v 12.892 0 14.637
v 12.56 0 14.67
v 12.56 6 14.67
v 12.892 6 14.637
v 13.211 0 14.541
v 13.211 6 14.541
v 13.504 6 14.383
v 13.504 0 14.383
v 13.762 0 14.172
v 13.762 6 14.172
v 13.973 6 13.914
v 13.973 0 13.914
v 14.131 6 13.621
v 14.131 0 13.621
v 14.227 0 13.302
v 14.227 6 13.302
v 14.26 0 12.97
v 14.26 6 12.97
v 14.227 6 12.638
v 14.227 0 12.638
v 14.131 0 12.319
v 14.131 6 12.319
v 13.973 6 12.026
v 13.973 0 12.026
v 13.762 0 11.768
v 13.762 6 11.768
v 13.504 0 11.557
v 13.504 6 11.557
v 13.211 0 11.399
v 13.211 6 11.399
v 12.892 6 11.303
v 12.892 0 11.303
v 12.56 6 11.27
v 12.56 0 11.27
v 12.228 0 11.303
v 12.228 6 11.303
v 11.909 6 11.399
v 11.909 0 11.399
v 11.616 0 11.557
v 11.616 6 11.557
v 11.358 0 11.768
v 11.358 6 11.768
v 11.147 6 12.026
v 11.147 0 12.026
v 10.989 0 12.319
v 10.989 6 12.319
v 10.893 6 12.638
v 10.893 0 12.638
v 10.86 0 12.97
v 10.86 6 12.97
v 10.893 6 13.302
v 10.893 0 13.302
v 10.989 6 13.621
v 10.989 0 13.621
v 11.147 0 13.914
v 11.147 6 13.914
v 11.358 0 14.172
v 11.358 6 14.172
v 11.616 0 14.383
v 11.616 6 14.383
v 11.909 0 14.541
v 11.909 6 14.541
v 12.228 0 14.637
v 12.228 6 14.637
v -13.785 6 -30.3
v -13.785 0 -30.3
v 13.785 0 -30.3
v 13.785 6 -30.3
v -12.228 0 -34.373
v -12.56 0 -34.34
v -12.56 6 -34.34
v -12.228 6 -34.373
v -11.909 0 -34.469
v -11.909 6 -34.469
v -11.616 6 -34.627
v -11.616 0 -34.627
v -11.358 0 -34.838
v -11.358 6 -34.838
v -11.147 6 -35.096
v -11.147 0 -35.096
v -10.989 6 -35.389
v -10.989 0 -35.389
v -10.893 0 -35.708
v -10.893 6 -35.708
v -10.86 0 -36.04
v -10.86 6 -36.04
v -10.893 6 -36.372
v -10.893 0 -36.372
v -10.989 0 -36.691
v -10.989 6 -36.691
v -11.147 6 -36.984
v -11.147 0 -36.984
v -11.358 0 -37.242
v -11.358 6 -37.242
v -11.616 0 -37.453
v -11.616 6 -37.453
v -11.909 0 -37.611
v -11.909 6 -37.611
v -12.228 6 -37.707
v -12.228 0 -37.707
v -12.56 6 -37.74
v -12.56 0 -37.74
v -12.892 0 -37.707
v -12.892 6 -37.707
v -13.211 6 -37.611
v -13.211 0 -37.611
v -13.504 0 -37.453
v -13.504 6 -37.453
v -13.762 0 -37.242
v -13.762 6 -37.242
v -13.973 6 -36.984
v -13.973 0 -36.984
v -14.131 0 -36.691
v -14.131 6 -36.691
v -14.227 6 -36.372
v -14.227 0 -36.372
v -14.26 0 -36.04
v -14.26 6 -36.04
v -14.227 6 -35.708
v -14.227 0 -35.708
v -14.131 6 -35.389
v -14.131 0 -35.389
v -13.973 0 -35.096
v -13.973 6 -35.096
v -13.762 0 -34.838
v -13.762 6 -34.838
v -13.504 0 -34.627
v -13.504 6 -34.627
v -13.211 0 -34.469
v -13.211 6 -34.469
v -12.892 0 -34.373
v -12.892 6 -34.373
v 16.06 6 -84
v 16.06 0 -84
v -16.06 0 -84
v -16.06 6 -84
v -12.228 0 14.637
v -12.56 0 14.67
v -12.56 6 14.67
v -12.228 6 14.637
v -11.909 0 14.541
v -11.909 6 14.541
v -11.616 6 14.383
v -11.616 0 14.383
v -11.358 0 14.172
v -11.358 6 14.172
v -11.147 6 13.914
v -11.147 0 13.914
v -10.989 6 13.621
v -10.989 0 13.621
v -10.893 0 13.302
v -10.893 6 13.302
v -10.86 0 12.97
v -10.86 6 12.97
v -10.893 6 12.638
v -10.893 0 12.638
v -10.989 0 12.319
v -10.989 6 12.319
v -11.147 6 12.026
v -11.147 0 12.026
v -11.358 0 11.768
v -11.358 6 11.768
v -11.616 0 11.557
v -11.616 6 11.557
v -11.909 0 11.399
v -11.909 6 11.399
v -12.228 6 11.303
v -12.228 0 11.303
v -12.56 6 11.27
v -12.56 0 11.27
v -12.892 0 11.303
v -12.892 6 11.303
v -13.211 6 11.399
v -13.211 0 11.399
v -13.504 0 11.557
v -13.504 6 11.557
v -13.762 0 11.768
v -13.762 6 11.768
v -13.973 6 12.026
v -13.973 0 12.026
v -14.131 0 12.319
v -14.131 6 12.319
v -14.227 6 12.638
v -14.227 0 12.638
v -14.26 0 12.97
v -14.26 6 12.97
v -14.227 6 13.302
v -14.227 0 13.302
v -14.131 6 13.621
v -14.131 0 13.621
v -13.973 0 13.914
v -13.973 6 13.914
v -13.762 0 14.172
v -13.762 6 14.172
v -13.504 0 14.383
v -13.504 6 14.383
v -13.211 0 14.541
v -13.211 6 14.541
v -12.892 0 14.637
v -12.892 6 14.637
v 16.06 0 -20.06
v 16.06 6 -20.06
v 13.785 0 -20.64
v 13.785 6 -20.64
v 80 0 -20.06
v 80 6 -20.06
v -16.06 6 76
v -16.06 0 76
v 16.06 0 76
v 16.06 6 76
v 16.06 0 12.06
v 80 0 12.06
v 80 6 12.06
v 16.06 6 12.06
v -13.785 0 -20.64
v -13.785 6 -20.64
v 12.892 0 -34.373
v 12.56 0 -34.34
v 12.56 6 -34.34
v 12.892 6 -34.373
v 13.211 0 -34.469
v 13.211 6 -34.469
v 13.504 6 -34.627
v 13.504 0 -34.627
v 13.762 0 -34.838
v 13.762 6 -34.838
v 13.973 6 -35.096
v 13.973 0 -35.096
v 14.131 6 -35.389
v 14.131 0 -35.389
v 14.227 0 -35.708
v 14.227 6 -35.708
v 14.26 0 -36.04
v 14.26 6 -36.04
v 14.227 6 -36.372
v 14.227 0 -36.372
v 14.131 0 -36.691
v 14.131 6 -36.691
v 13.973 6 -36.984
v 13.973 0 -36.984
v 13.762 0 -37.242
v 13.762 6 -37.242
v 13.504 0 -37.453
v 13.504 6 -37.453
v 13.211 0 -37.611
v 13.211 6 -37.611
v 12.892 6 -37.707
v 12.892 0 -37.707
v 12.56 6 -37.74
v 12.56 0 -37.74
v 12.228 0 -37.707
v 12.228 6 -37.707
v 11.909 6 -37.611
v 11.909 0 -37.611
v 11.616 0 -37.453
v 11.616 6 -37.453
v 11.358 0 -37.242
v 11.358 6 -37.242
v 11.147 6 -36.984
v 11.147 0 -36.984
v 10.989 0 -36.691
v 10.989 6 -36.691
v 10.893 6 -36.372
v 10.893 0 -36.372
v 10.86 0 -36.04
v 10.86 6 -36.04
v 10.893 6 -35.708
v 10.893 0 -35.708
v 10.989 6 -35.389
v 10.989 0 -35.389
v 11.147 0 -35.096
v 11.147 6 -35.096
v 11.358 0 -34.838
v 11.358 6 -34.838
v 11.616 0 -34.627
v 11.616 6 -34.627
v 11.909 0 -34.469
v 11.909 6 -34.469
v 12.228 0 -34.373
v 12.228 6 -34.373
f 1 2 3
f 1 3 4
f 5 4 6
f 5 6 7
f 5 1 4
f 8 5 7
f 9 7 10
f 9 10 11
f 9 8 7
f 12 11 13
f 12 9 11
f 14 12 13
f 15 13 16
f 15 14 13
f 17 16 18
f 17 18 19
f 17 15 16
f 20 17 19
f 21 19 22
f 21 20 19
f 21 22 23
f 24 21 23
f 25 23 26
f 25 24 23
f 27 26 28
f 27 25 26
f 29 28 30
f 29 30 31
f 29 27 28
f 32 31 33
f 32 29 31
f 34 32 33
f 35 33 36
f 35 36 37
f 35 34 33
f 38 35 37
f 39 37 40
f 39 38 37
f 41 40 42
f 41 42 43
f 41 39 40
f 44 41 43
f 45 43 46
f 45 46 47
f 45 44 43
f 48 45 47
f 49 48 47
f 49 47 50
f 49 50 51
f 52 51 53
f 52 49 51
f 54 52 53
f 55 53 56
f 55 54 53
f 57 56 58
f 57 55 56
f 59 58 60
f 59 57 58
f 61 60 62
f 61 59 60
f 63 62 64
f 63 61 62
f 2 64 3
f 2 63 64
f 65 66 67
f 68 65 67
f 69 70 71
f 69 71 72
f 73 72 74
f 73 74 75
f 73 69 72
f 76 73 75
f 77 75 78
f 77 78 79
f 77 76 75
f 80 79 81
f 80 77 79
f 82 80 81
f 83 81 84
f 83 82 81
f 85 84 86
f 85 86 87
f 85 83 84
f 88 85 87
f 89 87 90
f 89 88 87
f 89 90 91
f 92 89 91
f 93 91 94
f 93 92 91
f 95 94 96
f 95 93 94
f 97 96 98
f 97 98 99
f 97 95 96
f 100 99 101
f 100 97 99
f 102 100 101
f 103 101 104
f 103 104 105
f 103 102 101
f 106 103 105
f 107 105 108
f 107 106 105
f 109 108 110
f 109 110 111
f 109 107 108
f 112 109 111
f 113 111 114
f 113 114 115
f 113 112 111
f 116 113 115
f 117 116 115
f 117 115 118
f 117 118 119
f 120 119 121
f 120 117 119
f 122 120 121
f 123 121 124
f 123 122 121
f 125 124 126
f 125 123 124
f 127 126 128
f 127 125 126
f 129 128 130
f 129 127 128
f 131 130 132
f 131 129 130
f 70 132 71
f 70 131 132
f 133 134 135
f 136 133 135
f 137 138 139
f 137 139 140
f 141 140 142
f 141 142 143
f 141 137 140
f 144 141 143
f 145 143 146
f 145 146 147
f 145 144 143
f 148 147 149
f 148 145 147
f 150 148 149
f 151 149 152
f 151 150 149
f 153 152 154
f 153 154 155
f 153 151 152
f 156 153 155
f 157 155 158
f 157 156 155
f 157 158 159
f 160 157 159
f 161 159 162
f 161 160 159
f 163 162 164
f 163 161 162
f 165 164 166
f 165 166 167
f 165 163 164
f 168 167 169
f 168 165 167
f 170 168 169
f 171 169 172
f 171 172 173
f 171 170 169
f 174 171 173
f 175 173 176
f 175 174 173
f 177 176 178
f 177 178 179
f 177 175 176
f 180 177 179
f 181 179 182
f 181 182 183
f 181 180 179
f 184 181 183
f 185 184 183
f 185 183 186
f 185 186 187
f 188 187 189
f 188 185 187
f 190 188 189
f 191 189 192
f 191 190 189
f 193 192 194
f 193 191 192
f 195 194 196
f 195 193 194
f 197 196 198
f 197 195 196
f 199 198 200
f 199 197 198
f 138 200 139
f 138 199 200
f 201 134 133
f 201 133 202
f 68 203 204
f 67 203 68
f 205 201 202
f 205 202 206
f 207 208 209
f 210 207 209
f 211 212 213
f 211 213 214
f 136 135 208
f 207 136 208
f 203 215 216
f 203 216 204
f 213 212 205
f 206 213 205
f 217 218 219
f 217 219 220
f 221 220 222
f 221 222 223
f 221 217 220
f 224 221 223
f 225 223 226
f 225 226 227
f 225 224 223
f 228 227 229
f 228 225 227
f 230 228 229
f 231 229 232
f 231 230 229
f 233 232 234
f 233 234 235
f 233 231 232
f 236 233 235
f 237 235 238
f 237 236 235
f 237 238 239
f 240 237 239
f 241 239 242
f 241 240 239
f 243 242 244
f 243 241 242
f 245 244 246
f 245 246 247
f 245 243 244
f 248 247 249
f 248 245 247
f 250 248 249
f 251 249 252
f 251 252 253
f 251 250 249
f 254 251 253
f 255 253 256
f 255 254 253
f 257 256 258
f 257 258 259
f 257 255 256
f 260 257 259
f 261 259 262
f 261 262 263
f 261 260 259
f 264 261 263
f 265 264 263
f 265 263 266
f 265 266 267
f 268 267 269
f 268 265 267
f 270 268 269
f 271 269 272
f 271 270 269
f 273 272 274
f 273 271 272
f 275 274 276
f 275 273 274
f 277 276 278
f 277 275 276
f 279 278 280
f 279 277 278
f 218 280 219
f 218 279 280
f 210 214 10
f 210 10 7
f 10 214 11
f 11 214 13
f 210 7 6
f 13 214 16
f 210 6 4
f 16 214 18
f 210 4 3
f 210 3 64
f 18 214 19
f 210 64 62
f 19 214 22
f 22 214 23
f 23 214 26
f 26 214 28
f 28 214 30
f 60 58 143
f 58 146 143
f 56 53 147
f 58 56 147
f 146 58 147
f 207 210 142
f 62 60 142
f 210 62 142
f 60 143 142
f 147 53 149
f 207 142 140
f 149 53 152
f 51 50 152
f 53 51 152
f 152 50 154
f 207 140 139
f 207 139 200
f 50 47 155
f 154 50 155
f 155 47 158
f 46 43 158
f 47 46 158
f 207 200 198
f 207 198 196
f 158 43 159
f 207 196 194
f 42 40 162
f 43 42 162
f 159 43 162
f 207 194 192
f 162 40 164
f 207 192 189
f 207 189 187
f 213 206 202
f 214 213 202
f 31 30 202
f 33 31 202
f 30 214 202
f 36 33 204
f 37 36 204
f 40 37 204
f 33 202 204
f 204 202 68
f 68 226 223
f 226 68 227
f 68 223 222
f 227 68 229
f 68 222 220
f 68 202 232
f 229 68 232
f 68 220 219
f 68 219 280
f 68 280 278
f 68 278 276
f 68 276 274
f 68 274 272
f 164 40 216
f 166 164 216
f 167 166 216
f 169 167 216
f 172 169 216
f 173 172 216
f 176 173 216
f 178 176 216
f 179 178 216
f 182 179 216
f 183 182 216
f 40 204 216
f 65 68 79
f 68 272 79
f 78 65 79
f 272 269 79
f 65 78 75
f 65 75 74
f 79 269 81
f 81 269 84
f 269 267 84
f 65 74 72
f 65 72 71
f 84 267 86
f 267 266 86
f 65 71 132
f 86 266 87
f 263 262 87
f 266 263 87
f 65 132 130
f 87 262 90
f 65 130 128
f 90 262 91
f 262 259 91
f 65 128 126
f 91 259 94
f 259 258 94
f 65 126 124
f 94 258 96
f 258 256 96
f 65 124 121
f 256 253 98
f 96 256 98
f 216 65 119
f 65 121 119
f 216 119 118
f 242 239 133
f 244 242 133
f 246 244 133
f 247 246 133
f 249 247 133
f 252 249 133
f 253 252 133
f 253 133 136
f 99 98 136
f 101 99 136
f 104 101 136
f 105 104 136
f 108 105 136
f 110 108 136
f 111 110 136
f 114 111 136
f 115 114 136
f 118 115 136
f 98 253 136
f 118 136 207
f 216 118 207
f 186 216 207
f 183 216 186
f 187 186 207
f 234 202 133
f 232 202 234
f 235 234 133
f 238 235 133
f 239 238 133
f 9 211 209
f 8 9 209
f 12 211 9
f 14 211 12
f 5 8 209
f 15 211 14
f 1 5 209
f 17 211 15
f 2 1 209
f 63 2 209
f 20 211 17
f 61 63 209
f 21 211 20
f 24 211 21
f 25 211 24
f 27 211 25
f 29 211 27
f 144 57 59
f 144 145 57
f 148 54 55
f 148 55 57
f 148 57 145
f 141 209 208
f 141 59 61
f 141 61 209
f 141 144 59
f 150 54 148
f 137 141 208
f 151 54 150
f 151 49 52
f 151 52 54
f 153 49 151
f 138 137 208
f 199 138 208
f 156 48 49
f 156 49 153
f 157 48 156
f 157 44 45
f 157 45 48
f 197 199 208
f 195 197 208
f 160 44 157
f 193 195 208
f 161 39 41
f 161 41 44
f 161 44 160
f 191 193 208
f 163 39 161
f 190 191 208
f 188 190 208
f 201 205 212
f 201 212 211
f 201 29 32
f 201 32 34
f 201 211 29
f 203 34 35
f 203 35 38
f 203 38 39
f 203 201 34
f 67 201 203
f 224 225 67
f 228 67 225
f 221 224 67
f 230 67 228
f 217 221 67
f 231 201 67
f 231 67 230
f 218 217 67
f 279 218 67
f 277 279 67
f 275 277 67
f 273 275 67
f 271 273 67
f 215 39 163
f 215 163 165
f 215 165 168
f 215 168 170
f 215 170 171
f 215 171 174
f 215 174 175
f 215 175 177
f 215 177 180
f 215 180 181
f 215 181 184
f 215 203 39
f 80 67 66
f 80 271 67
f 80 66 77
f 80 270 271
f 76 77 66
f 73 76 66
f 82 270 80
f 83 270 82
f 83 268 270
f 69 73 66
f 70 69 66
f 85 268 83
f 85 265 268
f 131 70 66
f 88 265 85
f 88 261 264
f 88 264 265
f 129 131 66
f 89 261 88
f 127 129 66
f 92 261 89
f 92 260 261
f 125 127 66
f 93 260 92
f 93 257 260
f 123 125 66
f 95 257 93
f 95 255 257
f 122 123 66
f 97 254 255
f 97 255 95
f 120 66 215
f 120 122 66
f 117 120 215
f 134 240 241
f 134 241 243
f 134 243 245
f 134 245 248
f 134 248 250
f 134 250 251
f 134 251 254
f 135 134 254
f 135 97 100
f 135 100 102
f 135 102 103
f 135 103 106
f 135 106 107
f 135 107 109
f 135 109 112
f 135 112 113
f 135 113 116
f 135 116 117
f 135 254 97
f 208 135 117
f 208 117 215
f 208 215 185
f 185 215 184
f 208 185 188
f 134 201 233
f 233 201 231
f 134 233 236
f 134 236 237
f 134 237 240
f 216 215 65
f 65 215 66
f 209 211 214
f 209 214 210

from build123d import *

# Parameters (mm, degrees)
SKETCH21_R           = 1.7
SKETCH21_W           = 27.57
SKETCH21_H           = 9.66
BOSS_EXTRUDE18_DEPTH = 6


with BuildPart() as part:
    # Sketch21 → Boss-Extrude18 (new body)
    with BuildSketch(Plane(origin=(0, 0, 0), x_dir=(1, 0, 0), z_dir=(0, 1, 0))):
        Polygon((-16.06, -12.06), (-16.06, 20.06), (-16.06, 84), (0, 84), (16.06, 84), (16.06, 20.06), (80, 20.06), (80, 4), (80, -12.06), (16.06, -12.06), (16.06, -76), (0, -76), (-16.06, -76), align=None)
        with Locations(Location((-12.56, 36.04, 0), (0, 0, 270))):
            Circle(SKETCH21_R, mode=Mode.SUBTRACT)
        with Locations(Location((12.56, 36.04, 0), (0, 0, 270))):
            Circle(SKETCH21_R, mode=Mode.SUBTRACT)
        with Locations(Location((12.56, -12.97, 0), (0, 0, 270))):
            Circle(SKETCH21_R, mode=Mode.SUBTRACT)
        with Locations(Location((-12.56, -12.97, 0), (0, 0, 270))):
            Circle(SKETCH21_R, mode=Mode.SUBTRACT)
        with Locations((0, 25.47)):
            Rectangle(SKETCH21_W, SKETCH21_H, mode=Mode.SUBTRACT)
    extrude(amount=BOSS_EXTRUDE18_DEPTH)


solid = part.part
